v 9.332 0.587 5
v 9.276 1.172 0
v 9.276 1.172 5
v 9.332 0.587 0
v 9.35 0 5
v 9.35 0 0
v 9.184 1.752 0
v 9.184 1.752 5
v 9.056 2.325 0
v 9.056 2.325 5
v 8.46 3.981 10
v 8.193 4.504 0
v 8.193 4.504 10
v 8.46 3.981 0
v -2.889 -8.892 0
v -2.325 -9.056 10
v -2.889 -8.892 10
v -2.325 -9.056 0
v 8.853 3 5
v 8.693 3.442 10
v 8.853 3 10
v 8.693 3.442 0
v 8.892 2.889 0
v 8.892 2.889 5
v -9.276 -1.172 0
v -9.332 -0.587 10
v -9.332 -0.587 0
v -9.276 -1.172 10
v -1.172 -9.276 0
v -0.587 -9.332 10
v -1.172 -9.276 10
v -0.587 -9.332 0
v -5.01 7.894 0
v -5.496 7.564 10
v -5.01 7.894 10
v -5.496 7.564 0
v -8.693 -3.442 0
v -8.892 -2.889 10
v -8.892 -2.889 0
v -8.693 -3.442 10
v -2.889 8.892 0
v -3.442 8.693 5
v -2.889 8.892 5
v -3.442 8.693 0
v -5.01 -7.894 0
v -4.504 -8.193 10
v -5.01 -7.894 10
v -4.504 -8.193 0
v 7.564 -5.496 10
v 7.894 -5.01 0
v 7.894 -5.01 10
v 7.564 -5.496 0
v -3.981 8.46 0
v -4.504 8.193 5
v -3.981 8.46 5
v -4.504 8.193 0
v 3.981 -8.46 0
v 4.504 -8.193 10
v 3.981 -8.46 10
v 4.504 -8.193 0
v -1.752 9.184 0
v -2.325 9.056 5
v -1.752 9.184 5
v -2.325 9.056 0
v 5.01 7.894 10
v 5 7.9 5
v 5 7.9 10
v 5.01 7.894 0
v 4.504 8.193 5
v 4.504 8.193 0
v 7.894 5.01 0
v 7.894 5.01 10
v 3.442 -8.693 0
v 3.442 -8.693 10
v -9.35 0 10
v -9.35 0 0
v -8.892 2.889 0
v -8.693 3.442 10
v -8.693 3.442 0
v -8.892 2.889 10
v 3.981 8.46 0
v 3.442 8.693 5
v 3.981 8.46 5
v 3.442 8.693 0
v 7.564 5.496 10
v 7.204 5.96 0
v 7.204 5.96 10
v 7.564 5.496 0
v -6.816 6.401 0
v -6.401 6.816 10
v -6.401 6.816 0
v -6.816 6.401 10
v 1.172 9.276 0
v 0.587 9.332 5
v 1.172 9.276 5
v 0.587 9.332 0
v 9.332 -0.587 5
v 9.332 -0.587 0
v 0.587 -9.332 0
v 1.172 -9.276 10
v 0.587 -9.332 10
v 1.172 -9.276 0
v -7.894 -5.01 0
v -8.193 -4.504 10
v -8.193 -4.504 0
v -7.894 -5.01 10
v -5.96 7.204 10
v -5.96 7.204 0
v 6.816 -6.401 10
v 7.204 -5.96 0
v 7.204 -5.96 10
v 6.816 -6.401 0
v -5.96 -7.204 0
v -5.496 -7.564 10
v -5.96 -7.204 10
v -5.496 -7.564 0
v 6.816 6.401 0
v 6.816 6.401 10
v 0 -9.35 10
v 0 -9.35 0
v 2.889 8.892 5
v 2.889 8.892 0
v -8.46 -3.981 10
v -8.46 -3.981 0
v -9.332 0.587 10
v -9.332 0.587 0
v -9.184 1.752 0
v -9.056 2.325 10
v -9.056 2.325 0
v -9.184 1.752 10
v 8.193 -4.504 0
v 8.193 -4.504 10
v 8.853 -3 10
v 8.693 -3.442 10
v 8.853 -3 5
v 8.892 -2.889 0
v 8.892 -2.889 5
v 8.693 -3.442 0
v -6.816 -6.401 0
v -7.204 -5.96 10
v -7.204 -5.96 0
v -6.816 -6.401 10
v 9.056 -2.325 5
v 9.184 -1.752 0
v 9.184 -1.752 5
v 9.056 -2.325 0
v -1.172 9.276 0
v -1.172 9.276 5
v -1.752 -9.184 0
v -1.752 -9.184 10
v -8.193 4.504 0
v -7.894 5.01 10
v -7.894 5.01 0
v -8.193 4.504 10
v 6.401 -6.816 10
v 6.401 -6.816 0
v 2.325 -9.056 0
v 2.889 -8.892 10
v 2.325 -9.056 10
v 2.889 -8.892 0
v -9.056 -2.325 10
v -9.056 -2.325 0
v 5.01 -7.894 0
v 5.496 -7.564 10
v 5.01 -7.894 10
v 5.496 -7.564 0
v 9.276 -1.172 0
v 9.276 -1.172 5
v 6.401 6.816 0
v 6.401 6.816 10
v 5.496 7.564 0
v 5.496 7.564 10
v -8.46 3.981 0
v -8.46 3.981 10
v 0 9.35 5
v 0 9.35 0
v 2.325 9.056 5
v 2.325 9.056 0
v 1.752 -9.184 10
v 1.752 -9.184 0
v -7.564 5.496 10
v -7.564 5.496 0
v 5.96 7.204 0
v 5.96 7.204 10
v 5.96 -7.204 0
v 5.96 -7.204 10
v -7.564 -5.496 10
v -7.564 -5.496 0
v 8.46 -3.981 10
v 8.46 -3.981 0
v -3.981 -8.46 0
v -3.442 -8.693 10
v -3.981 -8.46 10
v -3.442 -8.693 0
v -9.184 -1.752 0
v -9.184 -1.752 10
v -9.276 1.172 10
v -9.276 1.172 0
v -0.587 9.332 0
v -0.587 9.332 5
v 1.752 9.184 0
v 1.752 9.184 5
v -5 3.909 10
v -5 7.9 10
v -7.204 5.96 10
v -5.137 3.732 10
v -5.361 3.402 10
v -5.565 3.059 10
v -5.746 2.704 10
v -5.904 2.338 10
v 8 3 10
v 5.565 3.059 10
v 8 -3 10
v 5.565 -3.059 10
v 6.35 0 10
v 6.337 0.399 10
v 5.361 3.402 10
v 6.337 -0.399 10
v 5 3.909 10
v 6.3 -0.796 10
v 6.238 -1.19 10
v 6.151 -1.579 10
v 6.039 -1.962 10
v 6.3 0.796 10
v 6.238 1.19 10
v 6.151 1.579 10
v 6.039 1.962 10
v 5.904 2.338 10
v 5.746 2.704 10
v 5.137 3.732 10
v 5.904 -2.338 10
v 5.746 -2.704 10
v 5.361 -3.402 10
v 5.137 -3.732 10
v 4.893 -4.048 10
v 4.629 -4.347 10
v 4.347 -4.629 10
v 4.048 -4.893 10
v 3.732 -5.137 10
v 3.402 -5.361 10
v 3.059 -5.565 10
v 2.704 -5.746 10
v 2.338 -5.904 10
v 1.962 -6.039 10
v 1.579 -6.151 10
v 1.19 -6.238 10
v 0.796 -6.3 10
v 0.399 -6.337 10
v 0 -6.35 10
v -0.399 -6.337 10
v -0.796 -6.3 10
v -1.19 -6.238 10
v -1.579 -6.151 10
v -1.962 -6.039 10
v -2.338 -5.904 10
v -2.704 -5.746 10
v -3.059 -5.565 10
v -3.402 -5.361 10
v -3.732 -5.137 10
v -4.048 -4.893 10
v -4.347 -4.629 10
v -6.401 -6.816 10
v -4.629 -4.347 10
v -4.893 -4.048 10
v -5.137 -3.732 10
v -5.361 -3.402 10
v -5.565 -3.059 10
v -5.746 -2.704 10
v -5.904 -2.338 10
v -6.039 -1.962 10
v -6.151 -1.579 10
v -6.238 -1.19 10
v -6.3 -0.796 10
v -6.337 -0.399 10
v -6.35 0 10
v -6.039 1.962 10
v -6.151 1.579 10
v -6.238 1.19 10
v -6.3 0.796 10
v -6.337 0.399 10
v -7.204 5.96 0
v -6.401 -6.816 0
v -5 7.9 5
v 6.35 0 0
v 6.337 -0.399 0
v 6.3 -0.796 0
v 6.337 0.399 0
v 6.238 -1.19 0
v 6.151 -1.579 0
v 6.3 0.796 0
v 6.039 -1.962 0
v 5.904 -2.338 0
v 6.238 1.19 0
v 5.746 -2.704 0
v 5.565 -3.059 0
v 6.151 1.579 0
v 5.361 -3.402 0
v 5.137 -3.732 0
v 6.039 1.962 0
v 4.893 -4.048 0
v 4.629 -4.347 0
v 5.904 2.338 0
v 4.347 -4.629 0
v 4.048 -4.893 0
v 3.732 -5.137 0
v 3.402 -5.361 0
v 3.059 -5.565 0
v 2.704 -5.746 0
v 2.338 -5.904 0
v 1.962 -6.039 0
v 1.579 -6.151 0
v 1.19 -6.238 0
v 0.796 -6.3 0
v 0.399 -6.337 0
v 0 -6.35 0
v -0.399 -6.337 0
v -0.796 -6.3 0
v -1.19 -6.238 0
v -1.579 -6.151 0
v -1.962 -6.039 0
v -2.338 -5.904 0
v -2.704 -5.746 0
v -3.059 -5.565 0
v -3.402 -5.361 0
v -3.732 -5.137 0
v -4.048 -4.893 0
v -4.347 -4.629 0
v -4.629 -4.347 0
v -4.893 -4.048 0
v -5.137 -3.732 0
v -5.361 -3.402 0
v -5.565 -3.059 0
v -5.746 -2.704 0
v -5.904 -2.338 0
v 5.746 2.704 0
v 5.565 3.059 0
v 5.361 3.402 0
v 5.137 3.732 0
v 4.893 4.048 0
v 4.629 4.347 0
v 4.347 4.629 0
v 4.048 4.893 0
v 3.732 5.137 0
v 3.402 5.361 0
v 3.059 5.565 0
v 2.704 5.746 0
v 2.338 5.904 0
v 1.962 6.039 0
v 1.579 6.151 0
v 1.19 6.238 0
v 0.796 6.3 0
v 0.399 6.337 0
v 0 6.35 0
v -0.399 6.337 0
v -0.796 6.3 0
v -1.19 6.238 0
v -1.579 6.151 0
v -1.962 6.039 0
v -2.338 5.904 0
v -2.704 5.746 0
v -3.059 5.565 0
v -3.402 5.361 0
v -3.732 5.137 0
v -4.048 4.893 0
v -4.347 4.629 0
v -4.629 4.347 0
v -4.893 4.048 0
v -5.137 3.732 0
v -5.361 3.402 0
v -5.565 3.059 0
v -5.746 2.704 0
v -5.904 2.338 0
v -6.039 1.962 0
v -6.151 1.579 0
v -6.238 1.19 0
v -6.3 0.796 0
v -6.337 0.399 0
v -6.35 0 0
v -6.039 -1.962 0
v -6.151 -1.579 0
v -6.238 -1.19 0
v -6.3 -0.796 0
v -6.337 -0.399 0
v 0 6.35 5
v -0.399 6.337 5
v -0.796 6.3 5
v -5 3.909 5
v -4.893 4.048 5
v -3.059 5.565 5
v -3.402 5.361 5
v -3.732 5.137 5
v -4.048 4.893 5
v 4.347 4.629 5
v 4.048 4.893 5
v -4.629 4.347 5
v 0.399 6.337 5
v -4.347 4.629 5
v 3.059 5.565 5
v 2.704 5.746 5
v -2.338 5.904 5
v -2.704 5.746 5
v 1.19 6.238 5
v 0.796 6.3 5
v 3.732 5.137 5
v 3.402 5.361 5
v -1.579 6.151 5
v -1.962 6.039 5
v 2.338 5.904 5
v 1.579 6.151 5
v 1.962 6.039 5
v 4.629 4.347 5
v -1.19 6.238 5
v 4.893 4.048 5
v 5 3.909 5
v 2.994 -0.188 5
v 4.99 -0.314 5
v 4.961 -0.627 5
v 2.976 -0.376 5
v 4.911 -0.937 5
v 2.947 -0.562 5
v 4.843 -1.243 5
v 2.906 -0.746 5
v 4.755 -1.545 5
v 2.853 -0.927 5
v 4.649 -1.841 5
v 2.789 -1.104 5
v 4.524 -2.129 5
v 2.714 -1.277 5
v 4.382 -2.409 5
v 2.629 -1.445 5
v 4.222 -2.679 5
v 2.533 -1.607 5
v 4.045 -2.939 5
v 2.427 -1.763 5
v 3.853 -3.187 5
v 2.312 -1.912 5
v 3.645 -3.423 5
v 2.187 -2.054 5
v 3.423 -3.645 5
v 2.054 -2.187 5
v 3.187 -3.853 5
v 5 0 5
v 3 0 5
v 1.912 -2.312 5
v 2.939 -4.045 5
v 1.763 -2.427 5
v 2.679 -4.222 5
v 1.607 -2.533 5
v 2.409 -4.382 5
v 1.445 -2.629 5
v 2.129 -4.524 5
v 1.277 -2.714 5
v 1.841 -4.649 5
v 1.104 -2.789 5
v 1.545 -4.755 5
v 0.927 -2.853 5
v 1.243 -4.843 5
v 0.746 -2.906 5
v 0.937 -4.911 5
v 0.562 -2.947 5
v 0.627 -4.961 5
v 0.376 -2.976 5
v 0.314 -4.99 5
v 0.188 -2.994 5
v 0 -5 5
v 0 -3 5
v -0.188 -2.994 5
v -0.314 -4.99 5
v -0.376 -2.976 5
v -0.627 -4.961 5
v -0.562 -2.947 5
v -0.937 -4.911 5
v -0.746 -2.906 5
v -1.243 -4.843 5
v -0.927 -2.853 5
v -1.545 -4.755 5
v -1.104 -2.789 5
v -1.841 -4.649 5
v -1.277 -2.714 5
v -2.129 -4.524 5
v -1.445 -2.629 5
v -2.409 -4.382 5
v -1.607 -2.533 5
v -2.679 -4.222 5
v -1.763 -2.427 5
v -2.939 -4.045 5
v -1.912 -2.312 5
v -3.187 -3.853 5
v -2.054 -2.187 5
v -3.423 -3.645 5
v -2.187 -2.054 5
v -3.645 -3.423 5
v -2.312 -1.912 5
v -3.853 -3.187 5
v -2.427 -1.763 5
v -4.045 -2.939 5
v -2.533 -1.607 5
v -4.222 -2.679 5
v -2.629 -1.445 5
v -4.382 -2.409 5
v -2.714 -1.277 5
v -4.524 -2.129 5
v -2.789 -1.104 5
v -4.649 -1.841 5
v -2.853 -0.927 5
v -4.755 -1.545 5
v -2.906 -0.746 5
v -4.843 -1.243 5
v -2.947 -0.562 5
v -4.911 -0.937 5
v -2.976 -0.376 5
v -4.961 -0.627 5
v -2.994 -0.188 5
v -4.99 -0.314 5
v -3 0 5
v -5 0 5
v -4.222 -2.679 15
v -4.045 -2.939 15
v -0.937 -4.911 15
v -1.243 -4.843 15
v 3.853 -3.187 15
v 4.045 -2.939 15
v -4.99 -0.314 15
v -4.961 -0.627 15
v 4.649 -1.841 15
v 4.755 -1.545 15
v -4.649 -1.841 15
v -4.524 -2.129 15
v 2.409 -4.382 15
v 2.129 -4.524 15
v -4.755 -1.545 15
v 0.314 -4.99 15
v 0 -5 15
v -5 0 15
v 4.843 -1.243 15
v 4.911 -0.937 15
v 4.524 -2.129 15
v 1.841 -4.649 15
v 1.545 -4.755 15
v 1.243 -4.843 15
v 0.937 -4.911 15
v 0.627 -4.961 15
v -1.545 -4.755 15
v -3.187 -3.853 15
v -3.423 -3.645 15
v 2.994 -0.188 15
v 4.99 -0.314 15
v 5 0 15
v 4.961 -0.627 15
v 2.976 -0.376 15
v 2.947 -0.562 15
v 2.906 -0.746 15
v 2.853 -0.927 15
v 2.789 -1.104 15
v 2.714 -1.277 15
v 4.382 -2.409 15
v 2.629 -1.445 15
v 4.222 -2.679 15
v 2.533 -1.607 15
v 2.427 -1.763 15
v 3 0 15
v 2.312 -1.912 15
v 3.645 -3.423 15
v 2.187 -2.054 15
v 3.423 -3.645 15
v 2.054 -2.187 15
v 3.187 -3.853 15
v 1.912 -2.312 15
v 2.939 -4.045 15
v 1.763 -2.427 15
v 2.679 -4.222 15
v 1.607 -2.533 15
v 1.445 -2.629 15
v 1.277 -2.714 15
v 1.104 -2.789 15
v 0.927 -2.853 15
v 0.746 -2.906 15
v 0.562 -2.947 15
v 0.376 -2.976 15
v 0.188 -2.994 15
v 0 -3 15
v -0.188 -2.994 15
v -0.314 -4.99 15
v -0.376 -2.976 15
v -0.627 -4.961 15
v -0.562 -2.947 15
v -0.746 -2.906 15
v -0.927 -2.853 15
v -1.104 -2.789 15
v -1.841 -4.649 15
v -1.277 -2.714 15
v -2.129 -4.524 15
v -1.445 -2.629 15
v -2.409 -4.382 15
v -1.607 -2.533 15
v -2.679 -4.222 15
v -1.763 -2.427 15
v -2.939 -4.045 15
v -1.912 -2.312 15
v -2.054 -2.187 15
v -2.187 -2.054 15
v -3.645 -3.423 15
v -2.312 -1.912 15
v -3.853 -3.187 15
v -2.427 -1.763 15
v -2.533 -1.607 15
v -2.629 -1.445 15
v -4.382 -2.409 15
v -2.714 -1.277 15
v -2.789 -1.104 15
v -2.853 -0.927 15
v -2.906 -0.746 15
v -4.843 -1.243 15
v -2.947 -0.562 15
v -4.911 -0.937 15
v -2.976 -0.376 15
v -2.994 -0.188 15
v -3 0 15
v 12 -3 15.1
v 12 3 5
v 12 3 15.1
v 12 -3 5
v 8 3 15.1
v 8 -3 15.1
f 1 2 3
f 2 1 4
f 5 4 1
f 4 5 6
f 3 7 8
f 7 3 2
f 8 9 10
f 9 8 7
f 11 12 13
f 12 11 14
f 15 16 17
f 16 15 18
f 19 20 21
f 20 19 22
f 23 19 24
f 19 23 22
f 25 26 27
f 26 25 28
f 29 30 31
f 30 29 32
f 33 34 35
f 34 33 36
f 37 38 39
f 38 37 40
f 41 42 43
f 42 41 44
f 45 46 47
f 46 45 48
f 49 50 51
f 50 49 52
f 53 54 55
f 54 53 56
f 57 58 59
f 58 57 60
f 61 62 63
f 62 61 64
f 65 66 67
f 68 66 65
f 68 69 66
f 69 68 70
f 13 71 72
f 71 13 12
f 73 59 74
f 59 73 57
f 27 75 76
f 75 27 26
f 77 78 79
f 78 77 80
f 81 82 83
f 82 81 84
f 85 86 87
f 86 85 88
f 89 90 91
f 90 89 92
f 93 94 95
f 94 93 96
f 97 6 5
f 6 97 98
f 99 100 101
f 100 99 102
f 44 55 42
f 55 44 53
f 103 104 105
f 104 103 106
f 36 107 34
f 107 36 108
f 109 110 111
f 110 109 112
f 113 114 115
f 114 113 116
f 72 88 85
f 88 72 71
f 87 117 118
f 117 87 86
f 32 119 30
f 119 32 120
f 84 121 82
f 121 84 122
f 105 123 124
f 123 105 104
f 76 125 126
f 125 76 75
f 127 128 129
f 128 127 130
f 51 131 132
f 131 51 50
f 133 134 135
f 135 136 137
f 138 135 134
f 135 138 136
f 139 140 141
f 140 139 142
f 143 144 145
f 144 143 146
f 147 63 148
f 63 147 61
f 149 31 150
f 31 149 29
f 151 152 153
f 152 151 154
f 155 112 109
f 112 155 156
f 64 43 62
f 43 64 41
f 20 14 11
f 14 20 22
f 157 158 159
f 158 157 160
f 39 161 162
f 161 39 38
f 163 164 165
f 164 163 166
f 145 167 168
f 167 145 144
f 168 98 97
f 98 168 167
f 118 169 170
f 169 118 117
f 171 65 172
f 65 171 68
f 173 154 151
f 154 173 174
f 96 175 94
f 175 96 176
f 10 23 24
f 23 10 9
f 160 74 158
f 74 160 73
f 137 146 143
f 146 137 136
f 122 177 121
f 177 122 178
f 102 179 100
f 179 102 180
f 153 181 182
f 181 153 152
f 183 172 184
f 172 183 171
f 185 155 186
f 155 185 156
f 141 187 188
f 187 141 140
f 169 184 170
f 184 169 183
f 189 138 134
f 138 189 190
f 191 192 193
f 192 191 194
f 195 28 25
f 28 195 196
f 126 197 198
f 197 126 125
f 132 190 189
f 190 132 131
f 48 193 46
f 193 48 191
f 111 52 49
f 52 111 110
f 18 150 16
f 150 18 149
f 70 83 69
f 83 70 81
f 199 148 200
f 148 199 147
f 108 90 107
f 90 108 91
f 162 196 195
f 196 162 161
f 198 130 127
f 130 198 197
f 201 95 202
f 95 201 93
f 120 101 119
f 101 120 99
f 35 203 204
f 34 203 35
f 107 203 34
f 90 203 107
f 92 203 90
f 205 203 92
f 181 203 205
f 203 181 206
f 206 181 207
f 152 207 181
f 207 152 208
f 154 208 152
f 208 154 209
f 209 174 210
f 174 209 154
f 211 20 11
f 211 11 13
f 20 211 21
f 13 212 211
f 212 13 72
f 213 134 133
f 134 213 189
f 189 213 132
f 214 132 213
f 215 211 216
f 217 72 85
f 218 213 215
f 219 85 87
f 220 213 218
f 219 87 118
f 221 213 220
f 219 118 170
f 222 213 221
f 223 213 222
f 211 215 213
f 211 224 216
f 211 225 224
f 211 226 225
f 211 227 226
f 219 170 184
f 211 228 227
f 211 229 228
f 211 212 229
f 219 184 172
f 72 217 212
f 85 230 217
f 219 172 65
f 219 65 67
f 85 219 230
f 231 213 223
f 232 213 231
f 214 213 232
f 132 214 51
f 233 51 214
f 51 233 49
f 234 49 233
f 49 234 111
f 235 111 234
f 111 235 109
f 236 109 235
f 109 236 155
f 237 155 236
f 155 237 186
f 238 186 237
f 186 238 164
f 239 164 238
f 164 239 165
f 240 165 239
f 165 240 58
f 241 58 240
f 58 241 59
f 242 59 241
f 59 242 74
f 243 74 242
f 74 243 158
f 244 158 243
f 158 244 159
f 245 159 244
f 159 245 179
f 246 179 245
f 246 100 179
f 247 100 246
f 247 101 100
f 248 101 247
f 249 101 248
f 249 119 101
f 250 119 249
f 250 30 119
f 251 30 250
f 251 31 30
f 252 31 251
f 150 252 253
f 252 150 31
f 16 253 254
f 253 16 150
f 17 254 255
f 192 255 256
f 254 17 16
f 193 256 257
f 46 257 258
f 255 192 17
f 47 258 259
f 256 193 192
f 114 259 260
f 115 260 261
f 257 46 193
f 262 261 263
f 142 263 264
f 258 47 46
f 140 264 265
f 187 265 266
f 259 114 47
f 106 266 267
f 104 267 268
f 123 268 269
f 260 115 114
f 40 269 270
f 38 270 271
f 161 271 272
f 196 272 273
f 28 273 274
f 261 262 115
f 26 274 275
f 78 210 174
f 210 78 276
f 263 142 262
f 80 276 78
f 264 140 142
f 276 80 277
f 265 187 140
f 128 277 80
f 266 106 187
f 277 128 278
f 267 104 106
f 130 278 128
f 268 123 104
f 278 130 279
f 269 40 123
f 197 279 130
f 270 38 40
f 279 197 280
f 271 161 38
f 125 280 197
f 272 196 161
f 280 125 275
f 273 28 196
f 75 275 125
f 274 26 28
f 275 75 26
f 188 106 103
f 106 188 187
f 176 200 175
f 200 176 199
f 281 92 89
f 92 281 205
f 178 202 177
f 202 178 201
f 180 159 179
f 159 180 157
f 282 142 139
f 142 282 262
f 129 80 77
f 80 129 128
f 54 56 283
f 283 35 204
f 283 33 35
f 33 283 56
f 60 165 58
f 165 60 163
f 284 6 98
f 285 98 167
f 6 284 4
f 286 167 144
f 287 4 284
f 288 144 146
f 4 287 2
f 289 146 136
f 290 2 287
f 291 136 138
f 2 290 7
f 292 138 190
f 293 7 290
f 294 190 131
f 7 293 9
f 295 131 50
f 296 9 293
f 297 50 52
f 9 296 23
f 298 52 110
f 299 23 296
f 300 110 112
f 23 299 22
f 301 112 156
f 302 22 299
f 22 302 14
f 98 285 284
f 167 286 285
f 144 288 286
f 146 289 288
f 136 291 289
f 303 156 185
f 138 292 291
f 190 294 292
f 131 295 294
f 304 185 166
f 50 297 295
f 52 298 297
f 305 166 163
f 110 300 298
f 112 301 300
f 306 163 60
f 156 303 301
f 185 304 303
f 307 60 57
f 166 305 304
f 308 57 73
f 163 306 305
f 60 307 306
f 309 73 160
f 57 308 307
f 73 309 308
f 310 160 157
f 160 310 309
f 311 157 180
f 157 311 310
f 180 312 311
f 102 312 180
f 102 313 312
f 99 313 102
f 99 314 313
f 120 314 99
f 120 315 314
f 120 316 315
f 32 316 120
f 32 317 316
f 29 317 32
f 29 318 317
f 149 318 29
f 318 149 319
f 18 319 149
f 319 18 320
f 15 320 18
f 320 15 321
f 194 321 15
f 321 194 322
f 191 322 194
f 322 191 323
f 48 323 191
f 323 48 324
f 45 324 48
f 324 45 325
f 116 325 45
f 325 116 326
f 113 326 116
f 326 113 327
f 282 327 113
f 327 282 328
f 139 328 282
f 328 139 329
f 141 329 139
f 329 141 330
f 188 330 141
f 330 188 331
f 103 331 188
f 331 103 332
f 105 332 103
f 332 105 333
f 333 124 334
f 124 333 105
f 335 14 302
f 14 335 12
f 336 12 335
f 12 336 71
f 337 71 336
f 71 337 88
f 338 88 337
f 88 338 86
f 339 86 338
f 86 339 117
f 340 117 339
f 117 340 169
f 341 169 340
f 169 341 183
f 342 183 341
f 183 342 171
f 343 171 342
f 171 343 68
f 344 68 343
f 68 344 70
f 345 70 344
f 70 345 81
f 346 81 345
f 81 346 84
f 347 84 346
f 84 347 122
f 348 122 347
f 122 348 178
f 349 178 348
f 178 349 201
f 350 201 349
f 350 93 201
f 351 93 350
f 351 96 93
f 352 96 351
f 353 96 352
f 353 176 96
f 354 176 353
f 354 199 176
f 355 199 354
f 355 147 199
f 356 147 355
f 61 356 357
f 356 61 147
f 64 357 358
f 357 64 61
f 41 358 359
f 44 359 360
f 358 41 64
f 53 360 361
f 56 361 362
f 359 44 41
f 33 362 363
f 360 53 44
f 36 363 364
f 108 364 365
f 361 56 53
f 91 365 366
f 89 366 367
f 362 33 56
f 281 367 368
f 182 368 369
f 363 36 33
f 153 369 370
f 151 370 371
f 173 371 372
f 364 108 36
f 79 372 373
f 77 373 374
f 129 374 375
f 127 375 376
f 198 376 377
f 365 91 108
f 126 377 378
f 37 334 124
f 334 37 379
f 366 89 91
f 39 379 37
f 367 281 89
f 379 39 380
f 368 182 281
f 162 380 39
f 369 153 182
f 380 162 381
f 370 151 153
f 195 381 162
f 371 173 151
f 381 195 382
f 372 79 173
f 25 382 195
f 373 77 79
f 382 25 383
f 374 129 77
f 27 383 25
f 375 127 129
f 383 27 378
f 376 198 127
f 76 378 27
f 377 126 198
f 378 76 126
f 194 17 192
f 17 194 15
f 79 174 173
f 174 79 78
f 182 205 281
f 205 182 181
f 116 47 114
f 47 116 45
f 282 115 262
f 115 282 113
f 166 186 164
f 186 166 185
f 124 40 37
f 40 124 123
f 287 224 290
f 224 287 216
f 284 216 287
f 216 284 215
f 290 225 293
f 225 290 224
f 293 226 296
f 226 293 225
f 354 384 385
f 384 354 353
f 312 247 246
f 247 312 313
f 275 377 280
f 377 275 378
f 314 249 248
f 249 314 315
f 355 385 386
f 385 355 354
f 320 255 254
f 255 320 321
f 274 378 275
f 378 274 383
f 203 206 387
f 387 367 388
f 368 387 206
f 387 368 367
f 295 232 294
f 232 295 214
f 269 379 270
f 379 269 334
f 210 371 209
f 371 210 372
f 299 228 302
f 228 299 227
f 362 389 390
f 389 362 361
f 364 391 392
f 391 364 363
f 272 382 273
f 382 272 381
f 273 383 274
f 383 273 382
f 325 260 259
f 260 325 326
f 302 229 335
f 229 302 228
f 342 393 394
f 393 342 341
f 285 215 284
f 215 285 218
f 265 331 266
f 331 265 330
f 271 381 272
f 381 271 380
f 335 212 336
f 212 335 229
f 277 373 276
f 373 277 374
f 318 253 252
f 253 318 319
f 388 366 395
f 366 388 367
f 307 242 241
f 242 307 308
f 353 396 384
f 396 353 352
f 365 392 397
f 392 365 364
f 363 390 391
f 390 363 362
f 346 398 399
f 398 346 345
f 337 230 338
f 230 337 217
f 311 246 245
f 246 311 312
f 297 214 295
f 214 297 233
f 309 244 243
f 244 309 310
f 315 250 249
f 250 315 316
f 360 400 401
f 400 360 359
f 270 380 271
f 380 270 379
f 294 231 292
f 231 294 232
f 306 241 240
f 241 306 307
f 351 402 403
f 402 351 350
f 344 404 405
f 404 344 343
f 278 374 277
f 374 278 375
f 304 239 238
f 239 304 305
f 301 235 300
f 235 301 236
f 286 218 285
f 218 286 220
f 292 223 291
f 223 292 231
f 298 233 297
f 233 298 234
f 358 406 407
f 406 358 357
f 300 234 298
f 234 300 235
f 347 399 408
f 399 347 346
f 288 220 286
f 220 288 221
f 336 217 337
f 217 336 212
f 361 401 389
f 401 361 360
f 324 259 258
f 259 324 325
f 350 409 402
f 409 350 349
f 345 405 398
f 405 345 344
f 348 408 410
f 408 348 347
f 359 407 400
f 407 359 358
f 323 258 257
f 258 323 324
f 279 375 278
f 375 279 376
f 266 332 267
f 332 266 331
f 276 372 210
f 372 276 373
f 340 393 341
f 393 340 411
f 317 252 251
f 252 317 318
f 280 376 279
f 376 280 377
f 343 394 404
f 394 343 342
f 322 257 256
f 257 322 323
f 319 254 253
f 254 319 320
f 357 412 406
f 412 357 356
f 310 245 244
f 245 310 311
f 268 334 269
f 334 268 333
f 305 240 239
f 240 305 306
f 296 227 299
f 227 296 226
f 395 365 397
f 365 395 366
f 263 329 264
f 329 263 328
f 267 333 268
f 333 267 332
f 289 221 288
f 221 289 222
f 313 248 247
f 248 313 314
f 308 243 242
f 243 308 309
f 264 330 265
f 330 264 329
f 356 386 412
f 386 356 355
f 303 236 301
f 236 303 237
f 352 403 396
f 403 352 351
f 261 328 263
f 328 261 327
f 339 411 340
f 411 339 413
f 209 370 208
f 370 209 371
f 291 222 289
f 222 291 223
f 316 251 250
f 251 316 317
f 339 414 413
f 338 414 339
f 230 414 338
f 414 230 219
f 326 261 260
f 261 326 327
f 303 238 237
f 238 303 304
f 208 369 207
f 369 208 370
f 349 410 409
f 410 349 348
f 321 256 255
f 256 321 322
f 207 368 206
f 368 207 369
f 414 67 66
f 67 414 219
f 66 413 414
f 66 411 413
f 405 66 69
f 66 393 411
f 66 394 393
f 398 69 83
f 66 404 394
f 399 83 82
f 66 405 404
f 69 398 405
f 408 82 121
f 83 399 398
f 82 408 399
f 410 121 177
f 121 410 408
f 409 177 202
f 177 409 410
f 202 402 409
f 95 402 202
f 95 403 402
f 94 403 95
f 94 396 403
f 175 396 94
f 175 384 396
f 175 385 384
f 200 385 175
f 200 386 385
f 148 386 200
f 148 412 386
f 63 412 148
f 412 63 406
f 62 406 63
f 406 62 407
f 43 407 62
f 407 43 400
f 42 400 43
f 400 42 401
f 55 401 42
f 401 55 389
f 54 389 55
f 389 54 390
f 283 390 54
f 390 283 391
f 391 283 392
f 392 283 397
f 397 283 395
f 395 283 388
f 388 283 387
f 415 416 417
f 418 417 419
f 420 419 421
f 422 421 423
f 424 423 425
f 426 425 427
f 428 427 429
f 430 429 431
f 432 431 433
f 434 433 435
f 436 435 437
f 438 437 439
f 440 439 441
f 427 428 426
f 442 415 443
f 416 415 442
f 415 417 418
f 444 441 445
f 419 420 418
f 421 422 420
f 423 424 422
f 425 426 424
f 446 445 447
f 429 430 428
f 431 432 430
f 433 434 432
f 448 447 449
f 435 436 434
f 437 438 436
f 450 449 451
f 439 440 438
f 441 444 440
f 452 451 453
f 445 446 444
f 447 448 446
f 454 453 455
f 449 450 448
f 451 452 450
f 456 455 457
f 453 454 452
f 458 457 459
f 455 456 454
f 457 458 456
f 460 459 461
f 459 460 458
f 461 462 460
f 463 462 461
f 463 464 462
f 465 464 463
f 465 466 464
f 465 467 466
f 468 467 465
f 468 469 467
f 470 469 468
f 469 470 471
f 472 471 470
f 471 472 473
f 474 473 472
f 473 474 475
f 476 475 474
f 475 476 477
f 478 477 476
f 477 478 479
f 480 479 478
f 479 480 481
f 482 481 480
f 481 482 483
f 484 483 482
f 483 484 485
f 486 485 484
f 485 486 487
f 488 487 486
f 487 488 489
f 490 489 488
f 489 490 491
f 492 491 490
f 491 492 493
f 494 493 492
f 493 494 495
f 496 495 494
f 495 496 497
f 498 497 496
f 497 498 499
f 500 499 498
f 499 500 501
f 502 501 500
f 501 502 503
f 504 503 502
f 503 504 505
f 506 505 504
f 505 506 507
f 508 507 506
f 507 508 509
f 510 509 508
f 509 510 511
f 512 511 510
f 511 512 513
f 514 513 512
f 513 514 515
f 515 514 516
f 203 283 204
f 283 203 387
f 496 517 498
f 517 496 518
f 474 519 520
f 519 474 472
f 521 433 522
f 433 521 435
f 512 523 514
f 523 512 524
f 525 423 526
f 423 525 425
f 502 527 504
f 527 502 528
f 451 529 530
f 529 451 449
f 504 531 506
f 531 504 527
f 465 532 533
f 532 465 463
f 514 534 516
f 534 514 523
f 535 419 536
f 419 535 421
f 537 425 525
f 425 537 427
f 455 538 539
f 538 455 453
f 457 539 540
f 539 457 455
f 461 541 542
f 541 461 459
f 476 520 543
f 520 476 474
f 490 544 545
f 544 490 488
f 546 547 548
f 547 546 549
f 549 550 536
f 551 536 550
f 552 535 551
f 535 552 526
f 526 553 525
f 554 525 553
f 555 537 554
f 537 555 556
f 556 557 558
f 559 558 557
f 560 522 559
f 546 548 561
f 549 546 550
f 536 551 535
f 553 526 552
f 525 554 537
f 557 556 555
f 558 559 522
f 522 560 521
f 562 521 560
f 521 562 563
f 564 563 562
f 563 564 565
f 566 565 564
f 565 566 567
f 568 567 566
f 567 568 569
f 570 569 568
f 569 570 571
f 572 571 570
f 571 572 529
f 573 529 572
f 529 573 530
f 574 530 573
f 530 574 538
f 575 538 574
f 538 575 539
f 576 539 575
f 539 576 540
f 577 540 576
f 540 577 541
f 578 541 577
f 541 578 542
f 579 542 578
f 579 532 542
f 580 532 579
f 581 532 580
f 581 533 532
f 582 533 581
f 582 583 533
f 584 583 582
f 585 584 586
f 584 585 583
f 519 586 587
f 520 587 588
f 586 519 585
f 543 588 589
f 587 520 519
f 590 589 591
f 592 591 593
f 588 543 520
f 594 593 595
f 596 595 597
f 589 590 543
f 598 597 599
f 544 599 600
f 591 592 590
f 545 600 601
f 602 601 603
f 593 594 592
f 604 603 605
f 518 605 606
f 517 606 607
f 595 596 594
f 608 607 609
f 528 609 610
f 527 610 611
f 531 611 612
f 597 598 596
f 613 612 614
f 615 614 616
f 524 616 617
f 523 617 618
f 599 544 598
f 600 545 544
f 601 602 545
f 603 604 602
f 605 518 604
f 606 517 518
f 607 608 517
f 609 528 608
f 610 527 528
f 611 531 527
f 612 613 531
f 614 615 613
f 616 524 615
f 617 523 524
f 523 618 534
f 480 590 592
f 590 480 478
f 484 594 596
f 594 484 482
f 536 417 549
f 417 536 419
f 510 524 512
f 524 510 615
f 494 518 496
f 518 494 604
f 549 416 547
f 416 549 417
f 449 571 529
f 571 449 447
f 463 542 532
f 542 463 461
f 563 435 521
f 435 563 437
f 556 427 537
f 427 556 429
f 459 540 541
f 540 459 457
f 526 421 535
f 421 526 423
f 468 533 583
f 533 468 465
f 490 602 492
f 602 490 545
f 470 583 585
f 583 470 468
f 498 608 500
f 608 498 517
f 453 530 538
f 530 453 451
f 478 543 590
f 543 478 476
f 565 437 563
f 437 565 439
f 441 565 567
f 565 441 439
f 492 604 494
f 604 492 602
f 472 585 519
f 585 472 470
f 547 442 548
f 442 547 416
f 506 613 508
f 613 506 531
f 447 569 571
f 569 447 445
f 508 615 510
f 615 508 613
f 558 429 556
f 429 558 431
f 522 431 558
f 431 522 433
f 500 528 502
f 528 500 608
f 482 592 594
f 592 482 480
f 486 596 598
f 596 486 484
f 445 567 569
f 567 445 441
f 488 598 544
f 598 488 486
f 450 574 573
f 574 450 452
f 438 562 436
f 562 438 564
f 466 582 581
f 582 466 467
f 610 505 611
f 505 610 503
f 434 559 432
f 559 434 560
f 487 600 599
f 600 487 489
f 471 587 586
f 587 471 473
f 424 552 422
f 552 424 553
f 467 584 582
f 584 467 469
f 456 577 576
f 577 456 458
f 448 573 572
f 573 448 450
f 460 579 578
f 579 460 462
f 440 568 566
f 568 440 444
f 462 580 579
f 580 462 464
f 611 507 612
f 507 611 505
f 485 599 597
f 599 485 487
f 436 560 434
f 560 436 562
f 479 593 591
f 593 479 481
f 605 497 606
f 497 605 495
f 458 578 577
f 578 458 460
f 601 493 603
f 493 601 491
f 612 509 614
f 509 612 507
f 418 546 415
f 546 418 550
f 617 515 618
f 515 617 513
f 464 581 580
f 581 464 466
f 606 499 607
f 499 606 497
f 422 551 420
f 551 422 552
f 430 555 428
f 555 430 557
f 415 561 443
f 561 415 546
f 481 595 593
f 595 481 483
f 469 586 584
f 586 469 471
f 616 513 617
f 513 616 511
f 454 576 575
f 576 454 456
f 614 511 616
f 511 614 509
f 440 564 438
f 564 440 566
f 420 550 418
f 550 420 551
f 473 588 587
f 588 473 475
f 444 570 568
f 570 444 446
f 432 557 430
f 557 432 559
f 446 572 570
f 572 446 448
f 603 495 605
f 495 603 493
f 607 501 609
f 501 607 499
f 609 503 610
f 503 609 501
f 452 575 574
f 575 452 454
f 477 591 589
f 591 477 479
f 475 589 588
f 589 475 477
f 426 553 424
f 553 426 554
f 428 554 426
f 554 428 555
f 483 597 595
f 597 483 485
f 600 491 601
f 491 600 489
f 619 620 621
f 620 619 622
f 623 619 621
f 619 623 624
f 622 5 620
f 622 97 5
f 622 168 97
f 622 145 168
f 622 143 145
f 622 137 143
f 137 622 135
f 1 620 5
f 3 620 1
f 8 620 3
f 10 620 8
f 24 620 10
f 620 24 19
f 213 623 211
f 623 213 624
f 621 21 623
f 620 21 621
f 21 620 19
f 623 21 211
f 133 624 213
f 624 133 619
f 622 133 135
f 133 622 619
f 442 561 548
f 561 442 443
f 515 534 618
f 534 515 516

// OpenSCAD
// Snap-on Clip for Lab Stand and Tubing
// Orientation: Flat on XY plane, building up in +Z.
// Units: Millimetres.

// --- Dimensions ---
// Rod Stand Dimensions
$rod_diameter = 12.7;      // Inner diameter of rod ring
$rod_wall = 3;             // Wall thickness of rod ring
$rod_outer = $rod_diameter + 2 * $rod_wall; // 18.7 mm
$rod_opening_width = 10;   // Width of the cutout on the -X side
$rod_opening_y_limit = 5;  // Half-height of the cutout on the -X side

// Tubing Dimensions
$tube_diameter = 6;        // Inner diameter of tubing ring
$tube_wall = 2;            // Wall thickness of tubing ring
$tube_outer = $tube_diameter + 2 * $tube_wall; // 10 mm
$tube_center_x = 15;       // X position of tubing ring center
$tube_opening_width = 4.5; // Width of the cutout on the +X side
$tube_opening_y_limit = 2.25; // Half-height of the cutout on the +X side

// Bridge Dimensions
$bridge_width_x = 4;       // Width of bridge in X (from 8 to 12)
$bridge_height_y = 6;      // Height of bridge in Y
$bridge_z = 10;            // Height of extrusion

// --- Configuration ---
$fn = 100;                 // Smoothness for curved shapes

// --- Main Body Profile ---
// We define the 2D profile in the XY plane and extrude it to Z.
// The profile is constructed using difference() to cut holes and openings.

difference() {
    // 1. Create the solid base shape (Union of Ring 1, Ring 2, and Bridge)
    union() {
        // --- Rod Ring (Left) ---
        // Outer circle centered at origin
        difference() {
            cylinder(
                h = $bridge_z,
                d = $rod_outer,
                center = [0, 0, $bridge_z/2]
            );
            
            // Cut inner hole for the rod
            cylinder(
                h = $bridge_z + 0.1, // Extend slightly past Z to ensure clean cut
                d = $rod_diameter,
                center = [0, 0, $bridge_z/2]
            );
            
            // Cut the -X side opening
            // We need to remove material where x < 0 and -y_limit < y < y_limit
            // We do this by subtracting a rectangular prism that is tall enough to cover the Z height
            translate([-($rod_opening_width/2), 0, $bridge_z/2]) {
                cube([
                    $rod_opening_width, 
                    $rod_opening_y_limit * 2, 
                    $bridge_z + 0.1
                ]);
            }
        }
        
        // --- Tubing Ring (Right) ---
        // Outer circle centered at x = $tube_center_x
        translate([0, 0, $bridge_z/2]) {
            difference() {
                cylinder(
                    h = $bridge_z,
                    d = $tube_outer,
                    center = [$tube_center_x, 0, $bridge_z/2]
                );
                
                // Cut inner hole for the tubing
                cylinder(
                    h = $bridge_z + 0.1,
                    d = $tube_diameter,
                    center = [$tube_center_x, 0, $bridge_z/2]
                );
                
                // Cut the +X side opening
                // Opening is centered at tube_center_x, extending to the right
                translate([$tube_center_x + ($tube_opening_width/2), 0, $bridge_z/2]) {
                    cube([
                        $tube_opening_width, 
                        $tube_opening_y_limit * 2, 
                        $bridge_z + 0.1
                    ]);
                }
            }
        }
        
        // --- Solid Bridge ---
        // Joins the two rings. 
        // Spans from x = 8 to x = 12.
        // Height in Y is 6 mm, centered at y=0.
        translate([8, -($bridge_height_y/2), $bridge_z/2]) {
            cube([
                $bridge_width_x, 
                $bridge_height_y, 
                $bridge_z + 0.1
            ]);
        }
    }
    
    // --- Cutouts for Openings ---
    // We explicitly cut the openings again here to ensure they are perfectly clean 
    // and extend slightly past the Z boundaries if needed, though the union logic above 
    // should handle it. This ensures the "snap" action is precise.
    
    // 1. Rod Ring Opening (-X side)
    // Remove everything with x < 0 and -5 < y < 5
    translate([-($rod_opening_width/2), 0, $bridge_z/2]) {
        cube([
            $rod_opening_width, 
            $rod_opening_y_limit * 2, 
            $bridge_z + 0.2 // Extend slightly past Z
        ]);
    }
    
    // 2. Tubing Ring Opening (+X side)
    // Remove everything with x > 15 and -2.25 < y < 2.25
    translate([$tube_center_x + ($tube_opening_width/2), 0, $bridge_z/2]) {
        cube([
            $tube_opening_width, 
            $tube_opening_y_limit * 2, 
            $bridge_z + 0.2 // Extend slightly past Z
        ]);
    }
}
